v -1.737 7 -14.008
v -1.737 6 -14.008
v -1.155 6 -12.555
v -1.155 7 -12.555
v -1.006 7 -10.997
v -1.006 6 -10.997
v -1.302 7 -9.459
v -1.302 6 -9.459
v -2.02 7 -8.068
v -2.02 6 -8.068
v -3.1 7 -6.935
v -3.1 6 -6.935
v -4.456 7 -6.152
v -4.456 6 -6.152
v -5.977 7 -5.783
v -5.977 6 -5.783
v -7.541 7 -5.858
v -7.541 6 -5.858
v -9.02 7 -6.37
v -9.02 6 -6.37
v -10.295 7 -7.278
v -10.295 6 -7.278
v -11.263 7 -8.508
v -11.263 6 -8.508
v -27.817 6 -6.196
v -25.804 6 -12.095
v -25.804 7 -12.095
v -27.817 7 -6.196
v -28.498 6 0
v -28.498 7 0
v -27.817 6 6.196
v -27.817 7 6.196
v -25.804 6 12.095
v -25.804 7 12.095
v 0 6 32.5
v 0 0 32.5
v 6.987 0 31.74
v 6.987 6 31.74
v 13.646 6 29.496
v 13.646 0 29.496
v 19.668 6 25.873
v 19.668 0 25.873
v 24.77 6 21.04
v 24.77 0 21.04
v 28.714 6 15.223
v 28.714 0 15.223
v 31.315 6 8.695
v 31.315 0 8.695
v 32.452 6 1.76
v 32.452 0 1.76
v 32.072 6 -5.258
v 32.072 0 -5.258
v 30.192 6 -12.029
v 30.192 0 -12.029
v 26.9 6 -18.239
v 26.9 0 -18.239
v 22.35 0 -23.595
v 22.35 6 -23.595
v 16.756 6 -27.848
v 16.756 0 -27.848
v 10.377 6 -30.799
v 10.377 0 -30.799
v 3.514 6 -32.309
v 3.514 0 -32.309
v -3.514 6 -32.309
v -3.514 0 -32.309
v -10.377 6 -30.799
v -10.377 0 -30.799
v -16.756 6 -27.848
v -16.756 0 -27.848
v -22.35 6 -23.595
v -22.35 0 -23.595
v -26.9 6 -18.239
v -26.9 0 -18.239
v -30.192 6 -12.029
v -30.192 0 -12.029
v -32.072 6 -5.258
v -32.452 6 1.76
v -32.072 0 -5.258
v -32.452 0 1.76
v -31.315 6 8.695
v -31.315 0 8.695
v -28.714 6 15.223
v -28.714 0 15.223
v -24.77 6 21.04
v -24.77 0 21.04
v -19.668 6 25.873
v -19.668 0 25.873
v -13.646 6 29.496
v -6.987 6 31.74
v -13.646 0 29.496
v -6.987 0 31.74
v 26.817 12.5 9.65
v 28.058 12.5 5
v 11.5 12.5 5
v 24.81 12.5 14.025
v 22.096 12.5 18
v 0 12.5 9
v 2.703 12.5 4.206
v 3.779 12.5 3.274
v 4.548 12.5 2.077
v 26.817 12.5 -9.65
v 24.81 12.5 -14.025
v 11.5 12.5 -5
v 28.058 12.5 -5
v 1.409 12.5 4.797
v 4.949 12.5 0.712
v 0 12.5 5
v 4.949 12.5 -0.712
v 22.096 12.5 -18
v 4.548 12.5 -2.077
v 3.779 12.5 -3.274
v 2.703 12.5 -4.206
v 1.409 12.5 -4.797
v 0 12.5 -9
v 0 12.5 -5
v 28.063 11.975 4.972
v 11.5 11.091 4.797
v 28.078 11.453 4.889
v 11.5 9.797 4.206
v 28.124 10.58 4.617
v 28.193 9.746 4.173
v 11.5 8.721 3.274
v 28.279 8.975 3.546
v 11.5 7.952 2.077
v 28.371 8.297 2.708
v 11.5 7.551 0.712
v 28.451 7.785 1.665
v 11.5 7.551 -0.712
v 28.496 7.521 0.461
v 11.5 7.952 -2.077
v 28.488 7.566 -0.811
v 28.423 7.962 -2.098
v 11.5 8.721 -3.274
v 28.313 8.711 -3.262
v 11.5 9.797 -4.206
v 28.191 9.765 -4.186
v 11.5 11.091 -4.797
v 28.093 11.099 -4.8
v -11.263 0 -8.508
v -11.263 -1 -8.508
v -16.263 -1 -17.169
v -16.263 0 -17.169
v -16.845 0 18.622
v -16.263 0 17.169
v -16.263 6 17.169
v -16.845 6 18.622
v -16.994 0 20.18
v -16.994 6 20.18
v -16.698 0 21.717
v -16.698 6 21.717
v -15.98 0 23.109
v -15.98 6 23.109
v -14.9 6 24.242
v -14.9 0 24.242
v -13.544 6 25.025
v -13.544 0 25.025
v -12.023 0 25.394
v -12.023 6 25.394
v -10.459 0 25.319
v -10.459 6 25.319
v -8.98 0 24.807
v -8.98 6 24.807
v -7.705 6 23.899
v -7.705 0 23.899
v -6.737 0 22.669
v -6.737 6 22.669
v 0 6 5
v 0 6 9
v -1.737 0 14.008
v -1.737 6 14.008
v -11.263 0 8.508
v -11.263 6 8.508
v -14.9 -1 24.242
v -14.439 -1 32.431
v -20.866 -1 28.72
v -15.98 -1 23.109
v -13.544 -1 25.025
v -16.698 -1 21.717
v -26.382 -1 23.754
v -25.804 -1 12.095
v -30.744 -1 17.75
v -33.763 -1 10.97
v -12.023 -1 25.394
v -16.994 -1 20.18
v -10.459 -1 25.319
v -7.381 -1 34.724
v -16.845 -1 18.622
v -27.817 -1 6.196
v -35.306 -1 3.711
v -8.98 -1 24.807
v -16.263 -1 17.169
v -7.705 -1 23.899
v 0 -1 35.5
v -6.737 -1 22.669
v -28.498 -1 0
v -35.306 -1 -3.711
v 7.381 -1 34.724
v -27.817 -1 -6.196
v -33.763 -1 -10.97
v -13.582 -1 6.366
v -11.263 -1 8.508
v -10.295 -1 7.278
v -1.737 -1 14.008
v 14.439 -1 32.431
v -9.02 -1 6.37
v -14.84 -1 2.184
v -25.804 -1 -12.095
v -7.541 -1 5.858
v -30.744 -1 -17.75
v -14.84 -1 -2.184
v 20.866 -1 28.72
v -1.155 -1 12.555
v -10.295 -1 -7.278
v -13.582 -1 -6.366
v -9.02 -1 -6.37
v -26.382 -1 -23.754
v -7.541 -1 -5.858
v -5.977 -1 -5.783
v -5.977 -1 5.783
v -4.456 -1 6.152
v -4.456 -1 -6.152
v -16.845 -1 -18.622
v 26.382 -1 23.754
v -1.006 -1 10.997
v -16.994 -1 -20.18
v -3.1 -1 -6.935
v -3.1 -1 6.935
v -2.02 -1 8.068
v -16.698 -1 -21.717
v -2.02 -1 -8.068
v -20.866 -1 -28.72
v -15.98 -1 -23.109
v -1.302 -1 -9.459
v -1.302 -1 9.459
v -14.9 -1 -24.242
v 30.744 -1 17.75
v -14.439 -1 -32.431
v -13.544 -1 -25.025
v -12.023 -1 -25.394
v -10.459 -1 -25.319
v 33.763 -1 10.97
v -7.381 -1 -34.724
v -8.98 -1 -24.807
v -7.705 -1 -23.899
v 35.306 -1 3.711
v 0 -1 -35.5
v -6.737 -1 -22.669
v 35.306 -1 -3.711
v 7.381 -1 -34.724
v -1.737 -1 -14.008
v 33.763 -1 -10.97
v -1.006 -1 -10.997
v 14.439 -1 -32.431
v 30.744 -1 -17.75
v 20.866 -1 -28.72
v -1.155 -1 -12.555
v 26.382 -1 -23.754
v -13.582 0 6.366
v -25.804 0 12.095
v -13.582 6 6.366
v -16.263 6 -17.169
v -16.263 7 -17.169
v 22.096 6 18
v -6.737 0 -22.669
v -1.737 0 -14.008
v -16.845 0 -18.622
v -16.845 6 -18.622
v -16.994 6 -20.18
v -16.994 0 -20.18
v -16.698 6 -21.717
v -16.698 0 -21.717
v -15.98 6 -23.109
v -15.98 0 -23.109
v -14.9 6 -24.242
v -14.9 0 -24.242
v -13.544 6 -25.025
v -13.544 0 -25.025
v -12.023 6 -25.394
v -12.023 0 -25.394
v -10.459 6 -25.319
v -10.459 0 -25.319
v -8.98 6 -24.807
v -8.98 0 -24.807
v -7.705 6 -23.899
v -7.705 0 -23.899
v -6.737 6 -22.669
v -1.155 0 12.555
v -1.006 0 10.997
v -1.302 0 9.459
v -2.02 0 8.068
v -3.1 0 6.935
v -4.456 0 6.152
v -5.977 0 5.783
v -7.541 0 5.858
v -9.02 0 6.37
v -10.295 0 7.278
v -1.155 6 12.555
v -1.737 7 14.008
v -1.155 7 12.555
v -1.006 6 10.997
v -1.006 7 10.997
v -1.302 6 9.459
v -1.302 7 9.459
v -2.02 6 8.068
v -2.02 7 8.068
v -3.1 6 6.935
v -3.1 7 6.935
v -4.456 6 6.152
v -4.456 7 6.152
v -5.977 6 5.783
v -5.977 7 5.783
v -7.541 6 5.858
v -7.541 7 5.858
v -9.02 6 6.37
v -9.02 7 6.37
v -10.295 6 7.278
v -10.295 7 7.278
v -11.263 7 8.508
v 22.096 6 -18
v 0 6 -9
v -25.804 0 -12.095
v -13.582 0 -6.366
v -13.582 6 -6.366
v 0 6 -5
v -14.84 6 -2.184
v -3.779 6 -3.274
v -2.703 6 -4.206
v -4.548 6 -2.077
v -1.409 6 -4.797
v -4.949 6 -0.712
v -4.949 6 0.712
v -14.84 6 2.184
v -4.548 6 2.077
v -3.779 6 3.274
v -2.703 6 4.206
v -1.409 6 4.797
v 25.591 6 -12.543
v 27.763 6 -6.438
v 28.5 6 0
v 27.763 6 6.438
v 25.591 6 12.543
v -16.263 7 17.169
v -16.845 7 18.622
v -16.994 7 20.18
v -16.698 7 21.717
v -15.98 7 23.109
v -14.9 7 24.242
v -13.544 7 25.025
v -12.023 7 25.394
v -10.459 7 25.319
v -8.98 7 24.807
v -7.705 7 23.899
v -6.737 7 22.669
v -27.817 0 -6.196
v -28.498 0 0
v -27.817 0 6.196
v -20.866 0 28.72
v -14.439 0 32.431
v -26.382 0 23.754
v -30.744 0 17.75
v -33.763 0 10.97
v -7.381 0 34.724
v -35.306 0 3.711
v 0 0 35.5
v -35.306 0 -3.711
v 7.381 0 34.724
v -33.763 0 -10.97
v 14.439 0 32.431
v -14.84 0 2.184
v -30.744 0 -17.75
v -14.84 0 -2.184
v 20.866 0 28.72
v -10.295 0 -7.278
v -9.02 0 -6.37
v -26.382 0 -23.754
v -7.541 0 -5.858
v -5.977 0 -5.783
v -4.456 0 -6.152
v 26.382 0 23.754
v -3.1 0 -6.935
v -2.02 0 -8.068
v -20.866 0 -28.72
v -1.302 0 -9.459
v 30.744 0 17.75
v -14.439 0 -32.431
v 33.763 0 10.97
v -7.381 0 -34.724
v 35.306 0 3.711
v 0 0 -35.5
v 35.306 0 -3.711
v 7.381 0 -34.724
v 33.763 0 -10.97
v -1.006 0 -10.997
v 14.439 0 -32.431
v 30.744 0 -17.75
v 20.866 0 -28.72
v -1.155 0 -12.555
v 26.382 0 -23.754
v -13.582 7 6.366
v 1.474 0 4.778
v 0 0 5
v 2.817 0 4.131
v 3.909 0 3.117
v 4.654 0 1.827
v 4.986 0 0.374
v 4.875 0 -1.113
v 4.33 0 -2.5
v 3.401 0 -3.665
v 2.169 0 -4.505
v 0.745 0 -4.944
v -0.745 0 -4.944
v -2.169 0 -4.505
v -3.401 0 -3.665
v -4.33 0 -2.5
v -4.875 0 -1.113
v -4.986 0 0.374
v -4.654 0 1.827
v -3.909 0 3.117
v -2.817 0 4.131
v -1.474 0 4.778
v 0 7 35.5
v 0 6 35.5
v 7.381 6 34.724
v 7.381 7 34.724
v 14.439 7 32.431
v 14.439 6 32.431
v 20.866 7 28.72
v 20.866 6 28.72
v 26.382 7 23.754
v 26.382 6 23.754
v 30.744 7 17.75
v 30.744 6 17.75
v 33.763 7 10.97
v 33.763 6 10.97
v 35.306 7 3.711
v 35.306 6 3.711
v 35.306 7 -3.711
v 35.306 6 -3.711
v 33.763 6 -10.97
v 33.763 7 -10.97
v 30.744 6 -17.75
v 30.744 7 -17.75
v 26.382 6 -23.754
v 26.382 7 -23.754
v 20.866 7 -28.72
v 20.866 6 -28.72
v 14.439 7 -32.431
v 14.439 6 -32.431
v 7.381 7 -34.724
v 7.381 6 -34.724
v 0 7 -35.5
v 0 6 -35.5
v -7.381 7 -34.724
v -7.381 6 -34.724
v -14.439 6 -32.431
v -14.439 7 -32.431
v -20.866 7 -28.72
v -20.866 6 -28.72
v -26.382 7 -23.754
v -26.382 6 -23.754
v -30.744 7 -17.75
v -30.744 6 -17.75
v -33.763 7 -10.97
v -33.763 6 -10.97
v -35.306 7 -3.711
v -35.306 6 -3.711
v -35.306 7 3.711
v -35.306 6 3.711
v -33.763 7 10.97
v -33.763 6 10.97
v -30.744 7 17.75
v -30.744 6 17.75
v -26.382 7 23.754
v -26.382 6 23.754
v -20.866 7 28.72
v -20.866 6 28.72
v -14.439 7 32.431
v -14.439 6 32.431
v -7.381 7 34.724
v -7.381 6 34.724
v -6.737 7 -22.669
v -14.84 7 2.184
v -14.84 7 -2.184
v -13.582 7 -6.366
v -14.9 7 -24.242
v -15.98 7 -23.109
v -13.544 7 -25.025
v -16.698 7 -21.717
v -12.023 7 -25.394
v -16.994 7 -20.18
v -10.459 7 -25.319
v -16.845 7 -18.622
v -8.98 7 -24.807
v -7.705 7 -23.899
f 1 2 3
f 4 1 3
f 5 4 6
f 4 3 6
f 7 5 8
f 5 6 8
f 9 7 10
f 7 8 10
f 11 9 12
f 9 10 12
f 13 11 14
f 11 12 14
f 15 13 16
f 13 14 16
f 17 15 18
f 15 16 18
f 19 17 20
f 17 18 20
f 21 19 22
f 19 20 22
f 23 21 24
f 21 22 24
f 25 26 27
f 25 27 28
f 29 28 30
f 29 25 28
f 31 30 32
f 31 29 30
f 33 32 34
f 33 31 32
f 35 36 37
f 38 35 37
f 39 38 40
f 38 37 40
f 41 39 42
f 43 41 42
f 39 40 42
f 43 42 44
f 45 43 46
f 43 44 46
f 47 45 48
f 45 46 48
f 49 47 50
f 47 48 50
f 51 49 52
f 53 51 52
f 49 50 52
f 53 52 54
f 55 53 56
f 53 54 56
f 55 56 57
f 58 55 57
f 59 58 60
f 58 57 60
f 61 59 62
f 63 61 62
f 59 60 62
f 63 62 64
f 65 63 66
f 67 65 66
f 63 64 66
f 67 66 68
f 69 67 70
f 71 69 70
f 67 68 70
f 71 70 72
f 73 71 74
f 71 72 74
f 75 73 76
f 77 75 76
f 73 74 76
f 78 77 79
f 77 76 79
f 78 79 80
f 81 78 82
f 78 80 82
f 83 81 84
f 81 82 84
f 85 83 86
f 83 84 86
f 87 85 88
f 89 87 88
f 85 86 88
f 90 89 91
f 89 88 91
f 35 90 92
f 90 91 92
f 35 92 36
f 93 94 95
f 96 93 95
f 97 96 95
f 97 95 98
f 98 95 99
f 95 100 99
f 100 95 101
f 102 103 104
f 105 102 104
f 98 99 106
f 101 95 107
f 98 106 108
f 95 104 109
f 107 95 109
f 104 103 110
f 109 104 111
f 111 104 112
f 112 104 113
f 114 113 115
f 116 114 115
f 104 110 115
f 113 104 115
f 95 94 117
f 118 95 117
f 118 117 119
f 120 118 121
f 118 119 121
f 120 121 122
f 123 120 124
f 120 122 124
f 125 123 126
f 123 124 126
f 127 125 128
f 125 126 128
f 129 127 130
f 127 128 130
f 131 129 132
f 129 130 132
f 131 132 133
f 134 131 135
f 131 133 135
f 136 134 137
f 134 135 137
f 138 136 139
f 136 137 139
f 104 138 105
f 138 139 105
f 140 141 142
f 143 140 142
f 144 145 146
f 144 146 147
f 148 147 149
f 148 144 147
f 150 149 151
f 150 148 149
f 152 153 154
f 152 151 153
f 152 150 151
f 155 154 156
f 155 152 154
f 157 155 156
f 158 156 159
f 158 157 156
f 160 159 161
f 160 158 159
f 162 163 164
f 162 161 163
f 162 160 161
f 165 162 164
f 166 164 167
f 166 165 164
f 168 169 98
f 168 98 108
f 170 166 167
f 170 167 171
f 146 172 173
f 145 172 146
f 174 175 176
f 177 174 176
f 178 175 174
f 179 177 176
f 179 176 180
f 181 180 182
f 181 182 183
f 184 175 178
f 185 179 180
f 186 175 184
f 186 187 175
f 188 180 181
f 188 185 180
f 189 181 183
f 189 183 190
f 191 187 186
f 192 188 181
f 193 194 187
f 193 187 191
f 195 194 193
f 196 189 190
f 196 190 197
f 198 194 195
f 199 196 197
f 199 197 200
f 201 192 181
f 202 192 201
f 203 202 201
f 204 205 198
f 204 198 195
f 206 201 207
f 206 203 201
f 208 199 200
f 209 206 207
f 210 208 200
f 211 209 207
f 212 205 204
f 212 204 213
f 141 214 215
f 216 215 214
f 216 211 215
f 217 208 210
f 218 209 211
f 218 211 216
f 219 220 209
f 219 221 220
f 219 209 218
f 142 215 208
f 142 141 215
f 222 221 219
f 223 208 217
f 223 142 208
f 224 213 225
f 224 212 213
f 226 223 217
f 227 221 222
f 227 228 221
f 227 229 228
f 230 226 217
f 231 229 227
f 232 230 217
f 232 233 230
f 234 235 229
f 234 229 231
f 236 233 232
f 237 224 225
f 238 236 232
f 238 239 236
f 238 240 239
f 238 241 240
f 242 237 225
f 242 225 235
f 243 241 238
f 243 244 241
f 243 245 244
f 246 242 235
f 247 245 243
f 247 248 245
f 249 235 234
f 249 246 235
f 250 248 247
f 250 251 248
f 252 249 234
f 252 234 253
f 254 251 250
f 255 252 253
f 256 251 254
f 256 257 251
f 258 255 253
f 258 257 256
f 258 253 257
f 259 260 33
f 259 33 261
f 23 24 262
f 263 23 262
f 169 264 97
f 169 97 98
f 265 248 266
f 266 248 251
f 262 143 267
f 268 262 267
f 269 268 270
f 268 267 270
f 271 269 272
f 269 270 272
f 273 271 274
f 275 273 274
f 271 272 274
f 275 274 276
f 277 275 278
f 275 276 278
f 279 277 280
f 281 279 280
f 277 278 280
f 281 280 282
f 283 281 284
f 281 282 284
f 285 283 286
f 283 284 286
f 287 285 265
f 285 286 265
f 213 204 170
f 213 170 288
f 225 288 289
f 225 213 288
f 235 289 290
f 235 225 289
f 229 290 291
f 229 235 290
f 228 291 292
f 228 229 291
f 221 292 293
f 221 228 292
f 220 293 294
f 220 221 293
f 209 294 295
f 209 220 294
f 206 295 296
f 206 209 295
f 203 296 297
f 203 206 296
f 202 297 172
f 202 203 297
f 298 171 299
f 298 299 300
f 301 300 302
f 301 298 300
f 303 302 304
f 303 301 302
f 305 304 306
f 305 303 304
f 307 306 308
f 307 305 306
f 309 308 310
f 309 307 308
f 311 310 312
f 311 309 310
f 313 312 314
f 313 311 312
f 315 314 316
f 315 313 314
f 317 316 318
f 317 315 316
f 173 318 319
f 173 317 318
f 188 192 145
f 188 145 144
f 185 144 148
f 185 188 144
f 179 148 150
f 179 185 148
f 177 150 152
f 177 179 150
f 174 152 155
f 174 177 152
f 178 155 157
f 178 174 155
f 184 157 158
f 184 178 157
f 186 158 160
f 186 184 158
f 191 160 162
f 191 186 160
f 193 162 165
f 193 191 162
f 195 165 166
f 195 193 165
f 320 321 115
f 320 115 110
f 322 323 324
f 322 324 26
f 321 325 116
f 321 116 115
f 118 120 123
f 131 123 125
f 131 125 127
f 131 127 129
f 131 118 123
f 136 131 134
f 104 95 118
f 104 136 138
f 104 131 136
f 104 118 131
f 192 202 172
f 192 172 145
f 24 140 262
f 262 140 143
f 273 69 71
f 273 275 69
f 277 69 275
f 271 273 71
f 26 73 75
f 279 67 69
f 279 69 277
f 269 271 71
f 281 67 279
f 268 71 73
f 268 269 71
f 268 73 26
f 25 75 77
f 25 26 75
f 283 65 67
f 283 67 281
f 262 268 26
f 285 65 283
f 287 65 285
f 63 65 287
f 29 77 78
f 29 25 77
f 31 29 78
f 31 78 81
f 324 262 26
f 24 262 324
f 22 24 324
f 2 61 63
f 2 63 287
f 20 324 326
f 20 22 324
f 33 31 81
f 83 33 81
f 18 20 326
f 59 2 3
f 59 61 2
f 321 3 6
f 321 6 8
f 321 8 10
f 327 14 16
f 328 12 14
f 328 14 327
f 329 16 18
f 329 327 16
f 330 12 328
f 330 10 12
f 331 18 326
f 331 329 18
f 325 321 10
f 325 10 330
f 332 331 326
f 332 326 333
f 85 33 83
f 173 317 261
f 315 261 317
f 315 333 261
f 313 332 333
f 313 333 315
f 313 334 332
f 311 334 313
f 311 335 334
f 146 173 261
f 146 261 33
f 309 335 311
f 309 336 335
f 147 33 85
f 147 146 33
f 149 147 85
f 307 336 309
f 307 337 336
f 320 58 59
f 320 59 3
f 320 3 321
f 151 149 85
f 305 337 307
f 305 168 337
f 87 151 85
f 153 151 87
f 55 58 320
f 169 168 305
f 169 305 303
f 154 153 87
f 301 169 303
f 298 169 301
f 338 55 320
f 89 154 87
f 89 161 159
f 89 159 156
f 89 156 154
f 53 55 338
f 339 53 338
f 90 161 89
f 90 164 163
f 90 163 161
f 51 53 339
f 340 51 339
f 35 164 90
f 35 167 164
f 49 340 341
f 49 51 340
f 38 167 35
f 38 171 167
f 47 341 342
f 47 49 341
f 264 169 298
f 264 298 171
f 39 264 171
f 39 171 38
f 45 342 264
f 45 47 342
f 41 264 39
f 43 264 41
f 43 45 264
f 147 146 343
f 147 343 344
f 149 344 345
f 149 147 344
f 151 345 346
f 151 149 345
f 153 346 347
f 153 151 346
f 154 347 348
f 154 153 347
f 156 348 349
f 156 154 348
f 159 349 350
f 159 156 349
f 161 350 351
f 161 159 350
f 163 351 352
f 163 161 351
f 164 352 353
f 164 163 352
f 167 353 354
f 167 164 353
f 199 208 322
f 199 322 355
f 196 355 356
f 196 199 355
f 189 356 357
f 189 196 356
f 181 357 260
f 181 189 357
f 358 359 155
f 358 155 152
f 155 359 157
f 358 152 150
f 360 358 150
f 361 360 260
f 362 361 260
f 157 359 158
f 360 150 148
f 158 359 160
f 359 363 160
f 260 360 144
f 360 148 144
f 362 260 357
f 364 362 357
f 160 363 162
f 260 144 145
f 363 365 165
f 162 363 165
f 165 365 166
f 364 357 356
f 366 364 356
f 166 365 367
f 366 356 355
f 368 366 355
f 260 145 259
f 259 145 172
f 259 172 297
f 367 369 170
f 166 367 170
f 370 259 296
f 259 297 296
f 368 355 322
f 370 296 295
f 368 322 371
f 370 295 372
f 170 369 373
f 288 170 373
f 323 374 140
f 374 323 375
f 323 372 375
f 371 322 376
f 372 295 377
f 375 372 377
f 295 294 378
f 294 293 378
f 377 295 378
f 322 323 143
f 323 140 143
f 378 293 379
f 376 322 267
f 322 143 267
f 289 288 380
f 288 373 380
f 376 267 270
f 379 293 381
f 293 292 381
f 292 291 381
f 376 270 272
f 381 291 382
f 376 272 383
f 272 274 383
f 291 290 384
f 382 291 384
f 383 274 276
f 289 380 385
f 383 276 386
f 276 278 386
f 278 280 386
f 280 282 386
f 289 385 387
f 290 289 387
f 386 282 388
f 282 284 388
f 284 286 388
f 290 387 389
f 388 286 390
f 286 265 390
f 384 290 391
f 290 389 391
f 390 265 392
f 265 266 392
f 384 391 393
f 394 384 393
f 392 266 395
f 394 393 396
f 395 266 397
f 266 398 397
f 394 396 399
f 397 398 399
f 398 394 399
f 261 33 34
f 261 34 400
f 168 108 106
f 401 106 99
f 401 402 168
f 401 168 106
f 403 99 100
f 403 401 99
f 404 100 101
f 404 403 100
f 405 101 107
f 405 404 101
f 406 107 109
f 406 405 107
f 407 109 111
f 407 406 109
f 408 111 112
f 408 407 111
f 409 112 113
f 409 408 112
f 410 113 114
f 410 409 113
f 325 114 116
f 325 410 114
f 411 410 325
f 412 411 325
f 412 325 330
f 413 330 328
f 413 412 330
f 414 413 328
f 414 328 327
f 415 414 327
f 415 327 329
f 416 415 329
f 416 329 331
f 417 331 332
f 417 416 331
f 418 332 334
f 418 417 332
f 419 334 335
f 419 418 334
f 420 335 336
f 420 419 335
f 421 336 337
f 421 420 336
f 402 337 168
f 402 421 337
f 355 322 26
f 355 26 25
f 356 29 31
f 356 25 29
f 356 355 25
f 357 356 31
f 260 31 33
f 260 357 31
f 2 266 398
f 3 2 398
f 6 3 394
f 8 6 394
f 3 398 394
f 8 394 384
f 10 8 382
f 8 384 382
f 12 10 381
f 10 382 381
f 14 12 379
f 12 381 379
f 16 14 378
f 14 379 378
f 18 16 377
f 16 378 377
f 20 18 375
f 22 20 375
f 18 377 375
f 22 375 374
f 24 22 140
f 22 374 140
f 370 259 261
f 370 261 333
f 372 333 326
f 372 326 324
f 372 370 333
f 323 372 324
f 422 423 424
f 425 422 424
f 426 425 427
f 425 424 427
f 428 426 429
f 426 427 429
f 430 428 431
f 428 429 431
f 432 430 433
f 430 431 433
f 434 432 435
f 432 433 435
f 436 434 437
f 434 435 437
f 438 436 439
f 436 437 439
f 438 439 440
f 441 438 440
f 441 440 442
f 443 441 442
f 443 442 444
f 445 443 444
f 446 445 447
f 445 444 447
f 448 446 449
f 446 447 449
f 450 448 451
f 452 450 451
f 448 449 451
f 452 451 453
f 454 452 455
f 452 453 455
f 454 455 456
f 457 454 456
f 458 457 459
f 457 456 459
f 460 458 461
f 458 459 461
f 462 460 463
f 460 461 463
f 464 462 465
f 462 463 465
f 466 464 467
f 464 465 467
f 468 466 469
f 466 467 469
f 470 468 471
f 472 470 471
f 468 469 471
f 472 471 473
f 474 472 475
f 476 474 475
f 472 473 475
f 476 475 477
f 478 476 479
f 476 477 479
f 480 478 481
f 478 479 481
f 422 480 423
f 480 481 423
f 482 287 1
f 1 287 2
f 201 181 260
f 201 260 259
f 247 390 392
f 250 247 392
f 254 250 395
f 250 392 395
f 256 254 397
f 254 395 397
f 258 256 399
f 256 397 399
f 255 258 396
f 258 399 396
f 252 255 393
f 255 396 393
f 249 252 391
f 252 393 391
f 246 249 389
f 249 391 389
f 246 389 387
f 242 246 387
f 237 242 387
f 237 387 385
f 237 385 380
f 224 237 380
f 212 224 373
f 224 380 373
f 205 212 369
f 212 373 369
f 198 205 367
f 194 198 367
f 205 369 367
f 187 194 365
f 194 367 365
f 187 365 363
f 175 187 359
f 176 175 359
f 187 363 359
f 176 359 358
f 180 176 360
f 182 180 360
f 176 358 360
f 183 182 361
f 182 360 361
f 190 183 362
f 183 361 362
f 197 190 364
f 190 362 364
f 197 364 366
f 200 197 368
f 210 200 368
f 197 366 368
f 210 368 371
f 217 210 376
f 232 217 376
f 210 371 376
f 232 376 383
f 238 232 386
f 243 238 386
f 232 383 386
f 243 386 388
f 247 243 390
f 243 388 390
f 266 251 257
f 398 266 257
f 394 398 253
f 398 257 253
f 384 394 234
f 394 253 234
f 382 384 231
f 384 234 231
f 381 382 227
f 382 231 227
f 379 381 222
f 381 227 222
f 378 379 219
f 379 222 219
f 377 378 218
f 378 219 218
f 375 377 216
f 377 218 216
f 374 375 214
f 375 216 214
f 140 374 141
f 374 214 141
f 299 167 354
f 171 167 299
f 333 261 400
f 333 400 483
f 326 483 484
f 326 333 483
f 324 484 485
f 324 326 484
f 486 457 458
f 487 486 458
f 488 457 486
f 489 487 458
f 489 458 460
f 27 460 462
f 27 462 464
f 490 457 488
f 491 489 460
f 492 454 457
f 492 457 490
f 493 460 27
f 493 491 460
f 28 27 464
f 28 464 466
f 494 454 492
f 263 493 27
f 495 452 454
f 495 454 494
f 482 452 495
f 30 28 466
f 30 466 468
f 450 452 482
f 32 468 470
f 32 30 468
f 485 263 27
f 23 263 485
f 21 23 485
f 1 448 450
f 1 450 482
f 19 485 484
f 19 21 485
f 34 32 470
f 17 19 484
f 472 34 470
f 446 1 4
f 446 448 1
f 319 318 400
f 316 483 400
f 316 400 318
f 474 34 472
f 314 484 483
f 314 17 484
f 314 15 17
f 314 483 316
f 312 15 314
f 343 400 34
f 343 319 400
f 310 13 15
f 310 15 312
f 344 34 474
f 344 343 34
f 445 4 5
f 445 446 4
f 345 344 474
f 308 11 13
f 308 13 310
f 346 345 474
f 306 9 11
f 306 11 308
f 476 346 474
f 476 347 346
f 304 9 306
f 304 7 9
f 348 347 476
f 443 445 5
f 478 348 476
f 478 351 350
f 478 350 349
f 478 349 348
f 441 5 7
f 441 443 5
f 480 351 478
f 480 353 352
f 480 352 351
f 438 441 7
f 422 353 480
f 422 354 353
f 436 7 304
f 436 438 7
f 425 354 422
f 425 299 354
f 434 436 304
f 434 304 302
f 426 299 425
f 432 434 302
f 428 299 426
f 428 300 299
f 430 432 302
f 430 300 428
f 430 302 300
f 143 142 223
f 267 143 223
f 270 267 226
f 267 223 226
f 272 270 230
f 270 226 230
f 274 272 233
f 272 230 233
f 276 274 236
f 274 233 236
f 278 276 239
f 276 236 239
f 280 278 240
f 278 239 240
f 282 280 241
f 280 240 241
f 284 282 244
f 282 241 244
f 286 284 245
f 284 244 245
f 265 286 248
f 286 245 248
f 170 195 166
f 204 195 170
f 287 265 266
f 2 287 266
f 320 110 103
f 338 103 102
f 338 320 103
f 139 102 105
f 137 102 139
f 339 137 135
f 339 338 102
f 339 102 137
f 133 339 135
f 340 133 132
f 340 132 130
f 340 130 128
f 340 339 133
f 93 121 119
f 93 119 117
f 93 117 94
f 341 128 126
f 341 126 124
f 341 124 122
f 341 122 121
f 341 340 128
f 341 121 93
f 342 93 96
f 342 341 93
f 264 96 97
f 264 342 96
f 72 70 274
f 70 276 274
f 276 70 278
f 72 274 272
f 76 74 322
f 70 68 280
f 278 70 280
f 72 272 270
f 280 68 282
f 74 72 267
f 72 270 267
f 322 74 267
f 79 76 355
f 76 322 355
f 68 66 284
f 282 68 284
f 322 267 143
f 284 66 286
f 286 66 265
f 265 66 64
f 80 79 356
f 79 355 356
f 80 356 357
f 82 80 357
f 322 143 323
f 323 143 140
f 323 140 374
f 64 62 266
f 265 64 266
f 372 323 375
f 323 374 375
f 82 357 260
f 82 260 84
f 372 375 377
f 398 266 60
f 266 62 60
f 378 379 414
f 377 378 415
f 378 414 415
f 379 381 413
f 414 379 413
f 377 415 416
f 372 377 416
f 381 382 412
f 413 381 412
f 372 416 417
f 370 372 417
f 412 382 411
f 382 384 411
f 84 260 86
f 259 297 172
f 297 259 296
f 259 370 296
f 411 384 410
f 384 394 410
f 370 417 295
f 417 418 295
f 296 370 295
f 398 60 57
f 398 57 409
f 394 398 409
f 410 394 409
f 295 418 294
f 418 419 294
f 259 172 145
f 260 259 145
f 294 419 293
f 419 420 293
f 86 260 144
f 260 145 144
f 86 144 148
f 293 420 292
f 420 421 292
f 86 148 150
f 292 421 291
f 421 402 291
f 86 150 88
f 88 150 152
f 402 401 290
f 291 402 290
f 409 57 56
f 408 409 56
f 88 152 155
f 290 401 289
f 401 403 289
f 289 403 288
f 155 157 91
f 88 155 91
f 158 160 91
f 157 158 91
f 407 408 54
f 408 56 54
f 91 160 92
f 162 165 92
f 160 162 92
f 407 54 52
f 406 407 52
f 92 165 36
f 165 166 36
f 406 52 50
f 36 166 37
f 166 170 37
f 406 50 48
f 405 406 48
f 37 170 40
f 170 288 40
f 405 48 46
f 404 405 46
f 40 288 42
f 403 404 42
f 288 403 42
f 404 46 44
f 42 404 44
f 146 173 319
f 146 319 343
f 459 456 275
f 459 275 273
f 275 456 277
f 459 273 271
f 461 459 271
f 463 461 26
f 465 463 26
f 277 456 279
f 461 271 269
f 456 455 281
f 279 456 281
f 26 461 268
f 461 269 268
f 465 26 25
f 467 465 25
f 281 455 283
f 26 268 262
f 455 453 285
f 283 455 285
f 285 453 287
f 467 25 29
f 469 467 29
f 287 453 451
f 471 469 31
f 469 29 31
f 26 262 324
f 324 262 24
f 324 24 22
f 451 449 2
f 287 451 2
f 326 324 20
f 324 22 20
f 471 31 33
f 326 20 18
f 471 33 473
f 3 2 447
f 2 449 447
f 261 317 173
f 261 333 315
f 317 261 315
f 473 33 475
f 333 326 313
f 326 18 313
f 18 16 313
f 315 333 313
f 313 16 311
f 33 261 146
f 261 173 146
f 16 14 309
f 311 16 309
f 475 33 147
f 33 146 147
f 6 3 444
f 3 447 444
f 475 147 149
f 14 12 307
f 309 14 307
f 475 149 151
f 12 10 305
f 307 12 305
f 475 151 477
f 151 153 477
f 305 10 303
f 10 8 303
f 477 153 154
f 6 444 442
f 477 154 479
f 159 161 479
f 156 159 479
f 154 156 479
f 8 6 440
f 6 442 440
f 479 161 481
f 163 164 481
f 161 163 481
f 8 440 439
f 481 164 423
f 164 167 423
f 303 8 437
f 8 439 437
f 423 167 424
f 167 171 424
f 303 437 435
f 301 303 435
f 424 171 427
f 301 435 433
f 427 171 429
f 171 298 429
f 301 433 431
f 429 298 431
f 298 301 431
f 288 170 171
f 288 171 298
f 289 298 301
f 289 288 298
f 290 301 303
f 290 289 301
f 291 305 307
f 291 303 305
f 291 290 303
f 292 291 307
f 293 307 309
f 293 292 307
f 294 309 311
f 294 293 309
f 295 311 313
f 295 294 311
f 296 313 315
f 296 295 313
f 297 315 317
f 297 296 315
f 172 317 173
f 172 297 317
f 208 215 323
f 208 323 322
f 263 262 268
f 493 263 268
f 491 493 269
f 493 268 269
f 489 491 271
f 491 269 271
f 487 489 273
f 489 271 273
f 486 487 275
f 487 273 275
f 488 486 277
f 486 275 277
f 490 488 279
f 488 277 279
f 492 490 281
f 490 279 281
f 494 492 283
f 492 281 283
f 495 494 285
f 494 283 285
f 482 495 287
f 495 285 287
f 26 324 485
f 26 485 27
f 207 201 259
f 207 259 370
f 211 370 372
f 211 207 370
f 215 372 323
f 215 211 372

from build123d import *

# Parameters (mm, degrees)
SKETCH1_R               = 32.5
SKETCH1_R_2             = 5
BOSS_EXTRUDE1_DEPTH     = 6
BOSS_EXTRUDE3_DEPTH     = 6.5
SKETCH6_R               = 5
CUT_EXTRUDE1_DEPTH      = 17
SKETCH11_R              = 35.5
BOSS_EXTRUDE4_DEPTH     = 1
SKETCH12_R              = 35.5
BOSS_EXTRUDE5_DEPTH     = 1
CUT_EXTRUDE4_DEPTH      = 51.690235746
CUT_EXTRUDE4_DEPTH_BACK = 51.690235746
CUT_EXTRUDE5_DEPTH      = 51.690235746
CUT_EXTRUDE5_DEPTH_BACK = 51.690235746


with BuildPart() as part:
    # Sketch1 → Boss-Extrude1 (new body)
    with BuildSketch(Plane(origin=(0, 0, 0), x_dir=(1, 0, 0), z_dir=(0, 1, 0))):
        with Locations(Location((0, 0, 0), (0, 0, 270))):
            Circle(SKETCH1_R)
        with Locations(Location((0, 0, 0), (0, 0, 270))):
            Circle(SKETCH1_R_2, mode=Mode.SUBTRACT)
    extrude(amount=BOSS_EXTRUDE1_DEPTH)

    # Sketch5 → Boss-Extrude3 (add)
    with BuildSketch(Plane(origin=(0, 6, 0), x_dir=(1, 0, 0), z_dir=(0, 1, 0))):
        with BuildLine():
            Line((0, 9), (22.096379794, 18))
            ThreePointArc((22.096379794, 18), (28.5, 0), (22.096379794, -18))
            Line((22.096379794, -18), (0, -9))
            Line((0, -9), (0, -5))
            ThreePointArc((0, -5), (5, 0), (0, 5))
            Line((0, 5), (0, 9))
        make_face()
    extrude(amount=BOSS_EXTRUDE3_DEPTH)

    # Sketch6 → Cut-Extrude1 (cut)
    with BuildSketch(Plane(origin=(28.5, 0, 0), x_dir=(0, 0, -1), z_dir=(1, 0, 0))):
        with Locations((0, 12.5)):
            Circle(SKETCH6_R)
    extrude(amount=-CUT_EXTRUDE1_DEPTH, mode=Mode.SUBTRACT)


with BuildPart() as body_2:
    # Sketch11 → Boss-Extrude4 (new body)
    with BuildSketch(Plane(origin=(0, 6, 0), x_dir=(1, 0, 0), z_dir=(0, 1, 0))):
        with Locations(Location((0, 0, 0), (0, 0, 270))):
            Circle(SKETCH11_R)
    extrude(amount=BOSS_EXTRUDE4_DEPTH)


with BuildPart() as body_3:
    # Sketch12 → Boss-Extrude5 (new body)
    with BuildSketch(Plane.XZ):
        with Locations(Location((0, 0, 0), (0, 0, 270))):
            Circle(SKETCH12_R)
    extrude(amount=BOSS_EXTRUDE5_DEPTH)


with BuildPart() as cut_extrude4_tool:
    # Sketch10 → Cut-Extrude4 (new, two sides: drawn at the far end of the back side and taken through both)
    with BuildSketch(Plane(origin=(0, 6, 0), x_dir=(1, 0, 0), z_dir=(0, 1, 0)).offset(-CUT_EXTRUDE4_DEPTH_BACK)):
        with BuildLine():
            Line((-13.582072734, 6.366105579), (-25.804414899, 12.094886611))
            ThreePointArc((-25.804414899, 12.094886611), (-28.498317677, 0), (-25.804414899, -12.094886611))
            Line((-25.804414899, -12.094886611), (-13.582072734, -6.366105579))
            ThreePointArc((-13.582072734, -6.366105579), (-15, 0), (-13.582072734, 6.366105579))
        make_face()
    extrude(amount=CUT_EXTRUDE4_DEPTH + CUT_EXTRUDE4_DEPTH_BACK)


with BuildPart() as part_1:
    add(part.part)

    # Cut-Extrude4: cut by cut_extrude4_tool
    add(cut_extrude4_tool.part, mode=Mode.SUBTRACT)


with BuildPart() as body_2_1:
    add(body_2.part)

    # Cut-Extrude4: cut by cut_extrude4_tool
    add(cut_extrude4_tool.part, mode=Mode.SUBTRACT)


with BuildPart() as body_3_1:
    add(body_3.part)

    # Cut-Extrude4: cut by cut_extrude4_tool
    add(cut_extrude4_tool.part, mode=Mode.SUBTRACT)


with BuildPart() as cut_extrude5_tool:
    # Sketch8 → Cut-Extrude5 (new, two sides: drawn at the far end of the back side and taken through both)
    with BuildSketch(Plane(origin=(0, 6, 0), x_dir=(1, 0, 0), z_dir=(0, 1, 0)).offset(-CUT_EXTRUDE5_DEPTH_BACK)):
        with BuildLine():
            Line((-6.736860279, 22.668584287), (-1.736860279, 14.008330249))
            ThreePointArc((-1.736860279, 14.008330249), (-3.75, 6.495190528), (-11.263139721, 8.508330249))
            Line((-11.263139721, 8.508330249), (-16.263139721, 17.168584287))
            ThreePointArc((-16.263139721, 17.168584287), (-14.25, 24.681724008), (-6.736860279, 22.668584287))
        make_face()
        with BuildLine():
            Line((-6.736860279, -22.668584287), (-1.736860279, -14.008330249))
            ThreePointArc((-1.736860279, -14.008330249), (-3.75, -6.495190528), (-11.263139721, -8.508330249))
            Line((-11.263139721, -8.508330249), (-16.263139721, -17.168584287))
            ThreePointArc((-16.263139721, -17.168584287), (-14.25, -24.681724008), (-6.736860279, -22.668584287))
        make_face()
    extrude(amount=CUT_EXTRUDE5_DEPTH + CUT_EXTRUDE5_DEPTH_BACK)


with BuildPart() as part_2:
    add(part_1.part)

    # Cut-Extrude5: cut by cut_extrude5_tool
    add(cut_extrude5_tool.part, mode=Mode.SUBTRACT)


with BuildPart() as body_2_2:
    add(body_2_1.part)

    # Cut-Extrude5: cut by cut_extrude5_tool
    add(cut_extrude5_tool.part, mode=Mode.SUBTRACT)


with BuildPart() as body_3_2:
    add(body_3_1.part)

    # Cut-Extrude5: cut by cut_extrude5_tool
    add(cut_extrude5_tool.part, mode=Mode.SUBTRACT)


solid = Compound([part_2.part, body_2_2.part, body_3_2.part])
